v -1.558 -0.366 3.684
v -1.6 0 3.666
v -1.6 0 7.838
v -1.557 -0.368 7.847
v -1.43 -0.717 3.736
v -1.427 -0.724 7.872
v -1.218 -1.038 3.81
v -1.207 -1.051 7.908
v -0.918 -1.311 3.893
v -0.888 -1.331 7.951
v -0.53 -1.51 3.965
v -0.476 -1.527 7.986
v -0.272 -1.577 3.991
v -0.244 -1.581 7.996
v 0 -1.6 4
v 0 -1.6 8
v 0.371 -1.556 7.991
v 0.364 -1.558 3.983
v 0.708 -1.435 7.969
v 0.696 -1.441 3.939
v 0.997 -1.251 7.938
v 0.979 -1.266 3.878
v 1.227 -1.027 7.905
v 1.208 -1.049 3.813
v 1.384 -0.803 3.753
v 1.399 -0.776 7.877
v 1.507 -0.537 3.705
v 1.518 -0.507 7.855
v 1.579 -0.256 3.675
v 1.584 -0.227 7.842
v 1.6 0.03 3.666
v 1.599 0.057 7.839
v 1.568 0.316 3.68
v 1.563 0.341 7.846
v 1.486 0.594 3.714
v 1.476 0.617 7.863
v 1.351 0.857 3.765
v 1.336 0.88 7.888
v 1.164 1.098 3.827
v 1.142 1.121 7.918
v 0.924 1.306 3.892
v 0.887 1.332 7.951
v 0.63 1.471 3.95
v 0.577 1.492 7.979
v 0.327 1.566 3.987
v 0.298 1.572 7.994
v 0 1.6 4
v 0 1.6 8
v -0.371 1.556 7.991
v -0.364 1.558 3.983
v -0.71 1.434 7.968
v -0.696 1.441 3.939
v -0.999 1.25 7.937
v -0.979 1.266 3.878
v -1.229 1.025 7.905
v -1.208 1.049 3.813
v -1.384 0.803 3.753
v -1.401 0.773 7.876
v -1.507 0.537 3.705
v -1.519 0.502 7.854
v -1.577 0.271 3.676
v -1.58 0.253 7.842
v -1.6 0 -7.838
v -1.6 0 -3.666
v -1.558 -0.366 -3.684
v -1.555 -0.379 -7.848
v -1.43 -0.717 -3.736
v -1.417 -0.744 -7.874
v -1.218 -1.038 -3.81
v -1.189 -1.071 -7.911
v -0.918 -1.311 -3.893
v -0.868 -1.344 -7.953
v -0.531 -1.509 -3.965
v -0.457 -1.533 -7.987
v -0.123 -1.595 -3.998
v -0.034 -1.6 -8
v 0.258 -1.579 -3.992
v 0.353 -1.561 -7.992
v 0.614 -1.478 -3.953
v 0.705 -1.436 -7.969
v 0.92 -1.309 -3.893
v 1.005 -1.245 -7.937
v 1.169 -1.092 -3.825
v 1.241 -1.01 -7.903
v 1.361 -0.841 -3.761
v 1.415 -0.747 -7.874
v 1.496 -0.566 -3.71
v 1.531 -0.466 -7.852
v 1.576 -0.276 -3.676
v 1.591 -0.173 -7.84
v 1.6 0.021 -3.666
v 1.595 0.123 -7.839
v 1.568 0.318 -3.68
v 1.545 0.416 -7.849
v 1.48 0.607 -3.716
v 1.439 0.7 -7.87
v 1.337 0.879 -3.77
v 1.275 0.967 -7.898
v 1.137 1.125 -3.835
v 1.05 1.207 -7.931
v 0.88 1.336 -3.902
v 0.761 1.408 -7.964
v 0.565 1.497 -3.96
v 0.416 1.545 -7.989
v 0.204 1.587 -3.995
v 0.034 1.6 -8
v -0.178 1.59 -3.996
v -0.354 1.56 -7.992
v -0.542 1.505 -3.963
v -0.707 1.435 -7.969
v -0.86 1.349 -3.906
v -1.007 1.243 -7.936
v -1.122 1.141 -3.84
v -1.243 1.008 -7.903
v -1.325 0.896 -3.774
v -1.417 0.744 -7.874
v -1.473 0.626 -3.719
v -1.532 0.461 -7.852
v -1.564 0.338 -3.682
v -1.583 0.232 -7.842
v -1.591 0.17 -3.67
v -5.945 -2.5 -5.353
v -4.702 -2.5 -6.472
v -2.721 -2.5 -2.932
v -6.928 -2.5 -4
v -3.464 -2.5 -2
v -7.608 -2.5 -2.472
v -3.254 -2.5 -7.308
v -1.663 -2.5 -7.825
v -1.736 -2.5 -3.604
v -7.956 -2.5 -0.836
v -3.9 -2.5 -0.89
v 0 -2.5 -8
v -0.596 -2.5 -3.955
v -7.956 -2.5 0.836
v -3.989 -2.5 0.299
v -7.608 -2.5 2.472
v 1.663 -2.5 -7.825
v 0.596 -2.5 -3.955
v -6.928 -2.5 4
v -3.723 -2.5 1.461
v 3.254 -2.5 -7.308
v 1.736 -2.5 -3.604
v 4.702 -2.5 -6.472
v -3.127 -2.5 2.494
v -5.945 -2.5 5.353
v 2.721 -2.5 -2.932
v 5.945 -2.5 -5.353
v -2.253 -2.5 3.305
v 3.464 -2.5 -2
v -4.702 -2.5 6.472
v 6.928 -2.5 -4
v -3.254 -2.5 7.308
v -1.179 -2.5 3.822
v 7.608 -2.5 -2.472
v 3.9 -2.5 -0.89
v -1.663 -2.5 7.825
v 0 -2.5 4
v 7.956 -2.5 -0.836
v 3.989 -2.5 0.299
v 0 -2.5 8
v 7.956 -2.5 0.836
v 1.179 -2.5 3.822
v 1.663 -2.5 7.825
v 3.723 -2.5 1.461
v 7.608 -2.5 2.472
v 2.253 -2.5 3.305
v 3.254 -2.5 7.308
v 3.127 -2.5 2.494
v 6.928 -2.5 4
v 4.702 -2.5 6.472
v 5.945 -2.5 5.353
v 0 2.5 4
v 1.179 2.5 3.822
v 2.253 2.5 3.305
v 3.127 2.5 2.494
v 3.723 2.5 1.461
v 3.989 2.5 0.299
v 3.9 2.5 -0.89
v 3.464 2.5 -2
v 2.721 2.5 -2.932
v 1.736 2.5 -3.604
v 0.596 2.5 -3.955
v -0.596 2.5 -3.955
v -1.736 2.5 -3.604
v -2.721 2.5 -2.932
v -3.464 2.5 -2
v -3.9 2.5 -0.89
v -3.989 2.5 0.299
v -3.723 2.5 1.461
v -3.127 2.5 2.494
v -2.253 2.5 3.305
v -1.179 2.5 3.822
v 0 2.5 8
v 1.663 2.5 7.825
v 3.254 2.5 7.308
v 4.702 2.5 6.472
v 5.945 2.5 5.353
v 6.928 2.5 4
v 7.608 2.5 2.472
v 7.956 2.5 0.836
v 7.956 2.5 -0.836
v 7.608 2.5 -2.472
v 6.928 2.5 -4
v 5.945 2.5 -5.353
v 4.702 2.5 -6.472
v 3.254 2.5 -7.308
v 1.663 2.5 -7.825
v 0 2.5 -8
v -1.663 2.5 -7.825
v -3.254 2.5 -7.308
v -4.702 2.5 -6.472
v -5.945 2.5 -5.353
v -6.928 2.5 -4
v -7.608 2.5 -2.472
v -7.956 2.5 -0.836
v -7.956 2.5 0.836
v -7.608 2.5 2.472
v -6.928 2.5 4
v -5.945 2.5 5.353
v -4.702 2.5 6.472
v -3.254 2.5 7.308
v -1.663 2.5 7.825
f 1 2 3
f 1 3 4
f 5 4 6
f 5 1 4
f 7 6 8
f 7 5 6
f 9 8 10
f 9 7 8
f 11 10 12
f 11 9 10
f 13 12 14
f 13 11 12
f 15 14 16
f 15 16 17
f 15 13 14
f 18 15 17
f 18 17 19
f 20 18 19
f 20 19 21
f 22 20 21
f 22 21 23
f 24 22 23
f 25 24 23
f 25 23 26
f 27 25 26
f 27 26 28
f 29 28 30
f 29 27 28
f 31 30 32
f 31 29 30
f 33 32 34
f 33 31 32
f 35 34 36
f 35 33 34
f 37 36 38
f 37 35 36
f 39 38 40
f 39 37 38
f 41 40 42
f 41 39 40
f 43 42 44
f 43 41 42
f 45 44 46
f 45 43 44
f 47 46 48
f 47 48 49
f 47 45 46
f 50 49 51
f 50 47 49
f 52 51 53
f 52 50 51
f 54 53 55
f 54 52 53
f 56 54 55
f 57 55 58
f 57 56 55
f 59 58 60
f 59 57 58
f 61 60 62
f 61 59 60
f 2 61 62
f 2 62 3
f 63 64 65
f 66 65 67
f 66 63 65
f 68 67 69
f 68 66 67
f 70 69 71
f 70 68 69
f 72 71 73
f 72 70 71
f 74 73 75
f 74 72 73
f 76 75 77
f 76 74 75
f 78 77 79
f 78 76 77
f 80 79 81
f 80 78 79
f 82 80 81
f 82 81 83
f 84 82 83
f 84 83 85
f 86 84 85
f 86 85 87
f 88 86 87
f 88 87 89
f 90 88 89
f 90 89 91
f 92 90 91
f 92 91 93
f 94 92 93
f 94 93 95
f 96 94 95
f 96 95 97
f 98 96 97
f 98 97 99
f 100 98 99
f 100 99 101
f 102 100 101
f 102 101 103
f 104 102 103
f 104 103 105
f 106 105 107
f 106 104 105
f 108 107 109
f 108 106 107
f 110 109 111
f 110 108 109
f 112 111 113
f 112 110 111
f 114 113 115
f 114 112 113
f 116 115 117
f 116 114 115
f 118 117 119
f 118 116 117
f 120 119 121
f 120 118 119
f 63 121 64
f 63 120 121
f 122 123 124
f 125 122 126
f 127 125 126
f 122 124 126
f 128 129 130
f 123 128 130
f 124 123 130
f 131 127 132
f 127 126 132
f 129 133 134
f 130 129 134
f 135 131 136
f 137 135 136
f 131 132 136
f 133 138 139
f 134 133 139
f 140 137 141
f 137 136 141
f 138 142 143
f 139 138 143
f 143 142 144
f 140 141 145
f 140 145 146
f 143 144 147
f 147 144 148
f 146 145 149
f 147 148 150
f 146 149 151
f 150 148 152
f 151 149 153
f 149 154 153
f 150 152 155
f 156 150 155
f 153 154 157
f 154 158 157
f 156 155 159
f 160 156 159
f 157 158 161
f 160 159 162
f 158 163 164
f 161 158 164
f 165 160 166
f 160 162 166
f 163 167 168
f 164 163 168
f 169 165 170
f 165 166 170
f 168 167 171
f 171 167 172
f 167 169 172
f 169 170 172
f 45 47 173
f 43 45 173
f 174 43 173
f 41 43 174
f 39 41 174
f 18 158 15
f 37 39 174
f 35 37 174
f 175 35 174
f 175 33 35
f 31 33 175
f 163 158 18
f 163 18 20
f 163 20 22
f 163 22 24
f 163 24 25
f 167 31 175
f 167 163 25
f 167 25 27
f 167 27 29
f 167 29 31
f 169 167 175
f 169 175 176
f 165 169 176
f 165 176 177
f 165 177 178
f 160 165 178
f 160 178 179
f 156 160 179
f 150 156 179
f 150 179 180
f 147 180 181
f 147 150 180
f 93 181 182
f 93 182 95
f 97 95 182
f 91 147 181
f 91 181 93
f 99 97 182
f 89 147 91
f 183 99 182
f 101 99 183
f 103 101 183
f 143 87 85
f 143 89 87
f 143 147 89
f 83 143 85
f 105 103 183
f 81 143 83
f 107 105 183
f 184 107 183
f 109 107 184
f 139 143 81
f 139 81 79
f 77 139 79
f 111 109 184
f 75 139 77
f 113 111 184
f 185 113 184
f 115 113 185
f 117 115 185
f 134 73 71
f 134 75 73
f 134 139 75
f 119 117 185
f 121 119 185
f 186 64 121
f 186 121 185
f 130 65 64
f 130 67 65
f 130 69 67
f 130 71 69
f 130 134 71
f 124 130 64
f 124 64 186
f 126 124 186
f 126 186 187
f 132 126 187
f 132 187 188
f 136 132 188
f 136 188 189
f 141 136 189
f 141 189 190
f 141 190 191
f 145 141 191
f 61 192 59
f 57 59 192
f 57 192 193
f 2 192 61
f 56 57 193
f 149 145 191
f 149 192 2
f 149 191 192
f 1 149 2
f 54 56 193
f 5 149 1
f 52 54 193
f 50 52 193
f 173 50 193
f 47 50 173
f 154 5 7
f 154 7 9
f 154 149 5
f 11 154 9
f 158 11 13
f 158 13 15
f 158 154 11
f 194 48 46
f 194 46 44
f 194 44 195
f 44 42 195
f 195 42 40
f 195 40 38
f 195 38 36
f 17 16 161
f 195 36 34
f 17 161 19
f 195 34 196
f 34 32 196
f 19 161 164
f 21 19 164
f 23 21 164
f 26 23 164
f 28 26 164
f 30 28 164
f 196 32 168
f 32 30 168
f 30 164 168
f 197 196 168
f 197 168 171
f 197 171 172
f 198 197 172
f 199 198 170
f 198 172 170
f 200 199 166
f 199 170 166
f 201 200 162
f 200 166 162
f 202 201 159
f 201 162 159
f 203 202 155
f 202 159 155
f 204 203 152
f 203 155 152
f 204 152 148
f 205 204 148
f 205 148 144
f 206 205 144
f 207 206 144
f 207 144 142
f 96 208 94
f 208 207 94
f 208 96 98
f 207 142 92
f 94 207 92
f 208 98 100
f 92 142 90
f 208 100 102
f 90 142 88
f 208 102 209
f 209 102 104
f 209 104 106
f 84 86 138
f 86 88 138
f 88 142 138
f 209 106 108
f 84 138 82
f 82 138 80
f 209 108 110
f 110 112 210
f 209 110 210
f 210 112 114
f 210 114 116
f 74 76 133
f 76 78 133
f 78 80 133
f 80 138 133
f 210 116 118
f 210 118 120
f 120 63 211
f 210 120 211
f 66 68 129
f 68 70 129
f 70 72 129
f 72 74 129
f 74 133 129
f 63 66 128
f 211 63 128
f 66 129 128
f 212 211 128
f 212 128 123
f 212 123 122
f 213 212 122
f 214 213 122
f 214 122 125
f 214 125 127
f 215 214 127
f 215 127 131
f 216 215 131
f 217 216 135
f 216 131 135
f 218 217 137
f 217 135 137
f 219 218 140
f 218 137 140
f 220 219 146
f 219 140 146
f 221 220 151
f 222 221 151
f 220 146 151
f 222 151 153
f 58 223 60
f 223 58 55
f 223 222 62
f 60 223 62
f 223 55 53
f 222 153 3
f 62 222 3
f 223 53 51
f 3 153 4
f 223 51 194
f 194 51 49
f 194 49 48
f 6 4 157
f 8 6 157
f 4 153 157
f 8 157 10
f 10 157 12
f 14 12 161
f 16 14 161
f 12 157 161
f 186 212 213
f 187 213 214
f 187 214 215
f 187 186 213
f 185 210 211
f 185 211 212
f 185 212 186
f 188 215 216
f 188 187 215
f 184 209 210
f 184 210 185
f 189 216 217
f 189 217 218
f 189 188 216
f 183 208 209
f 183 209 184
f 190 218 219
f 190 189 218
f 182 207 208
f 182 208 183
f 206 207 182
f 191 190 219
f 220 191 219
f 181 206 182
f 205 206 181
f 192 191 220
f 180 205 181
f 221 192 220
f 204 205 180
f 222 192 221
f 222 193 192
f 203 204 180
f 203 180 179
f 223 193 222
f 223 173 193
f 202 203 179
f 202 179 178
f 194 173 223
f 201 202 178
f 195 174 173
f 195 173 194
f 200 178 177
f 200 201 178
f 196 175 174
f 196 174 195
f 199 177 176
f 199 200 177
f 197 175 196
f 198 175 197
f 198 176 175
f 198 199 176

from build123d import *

# Parameters (mm, degrees)
ESQUISSE1_R                  = 8
ESQUISSE1_R_2                = 4
BOSS_EXTRU_1_DEPTH           = 2.5
BOSS_EXTRU_2_START           = -2.5
ESQUISSE1_2_R                = 8
ESQUISSE1_2_R_2              = 4
BOSS_EXTRU_2_DEPTH           = 2.5
ENL_V_MAT_EXTRU_1_DEPTH      = 50
ENL_V_MAT_EXTRU_1_DEPTH_BACK = 50
ESQUISSE2_R                  = 1.6


with BuildPart() as part:
    # Esquisse1 → Boss.-Extru.1 (new body)
    with BuildSketch(Plane(origin=(0, 0, 0), x_dir=(1, 0, 0), z_dir=(0, 1, 0))):
        Circle(ESQUISSE1_R)
        Circle(ESQUISSE1_R_2, mode=Mode.SUBTRACT)
    extrude(amount=BOSS_EXTRU_1_DEPTH)

    # Esquisse1<2> → Boss.-Extru.2 (add)
    with BuildSketch(Plane(origin=(0, 0, 0), x_dir=(1, 0, 0), z_dir=(0, 1, 0)).offset(BOSS_EXTRU_2_START)):
        Circle(ESQUISSE1_2_R)
        Circle(ESQUISSE1_2_R_2, mode=Mode.SUBTRACT)
    extrude(amount=BOSS_EXTRU_2_DEPTH)

    # Esquisse2 → Enlèv. mat.-Extru.1 (cut, two sides: drawn at the far end of the back side and taken through both)
    with BuildSketch(Plane.XY.offset(-ENL_V_MAT_EXTRU_1_DEPTH_BACK)):
        Circle(ESQUISSE2_R)
    extrude(amount=ENL_V_MAT_EXTRU_1_DEPTH + ENL_V_MAT_EXTRU_1_DEPTH_BACK, mode=Mode.SUBTRACT)


solid = part.part
